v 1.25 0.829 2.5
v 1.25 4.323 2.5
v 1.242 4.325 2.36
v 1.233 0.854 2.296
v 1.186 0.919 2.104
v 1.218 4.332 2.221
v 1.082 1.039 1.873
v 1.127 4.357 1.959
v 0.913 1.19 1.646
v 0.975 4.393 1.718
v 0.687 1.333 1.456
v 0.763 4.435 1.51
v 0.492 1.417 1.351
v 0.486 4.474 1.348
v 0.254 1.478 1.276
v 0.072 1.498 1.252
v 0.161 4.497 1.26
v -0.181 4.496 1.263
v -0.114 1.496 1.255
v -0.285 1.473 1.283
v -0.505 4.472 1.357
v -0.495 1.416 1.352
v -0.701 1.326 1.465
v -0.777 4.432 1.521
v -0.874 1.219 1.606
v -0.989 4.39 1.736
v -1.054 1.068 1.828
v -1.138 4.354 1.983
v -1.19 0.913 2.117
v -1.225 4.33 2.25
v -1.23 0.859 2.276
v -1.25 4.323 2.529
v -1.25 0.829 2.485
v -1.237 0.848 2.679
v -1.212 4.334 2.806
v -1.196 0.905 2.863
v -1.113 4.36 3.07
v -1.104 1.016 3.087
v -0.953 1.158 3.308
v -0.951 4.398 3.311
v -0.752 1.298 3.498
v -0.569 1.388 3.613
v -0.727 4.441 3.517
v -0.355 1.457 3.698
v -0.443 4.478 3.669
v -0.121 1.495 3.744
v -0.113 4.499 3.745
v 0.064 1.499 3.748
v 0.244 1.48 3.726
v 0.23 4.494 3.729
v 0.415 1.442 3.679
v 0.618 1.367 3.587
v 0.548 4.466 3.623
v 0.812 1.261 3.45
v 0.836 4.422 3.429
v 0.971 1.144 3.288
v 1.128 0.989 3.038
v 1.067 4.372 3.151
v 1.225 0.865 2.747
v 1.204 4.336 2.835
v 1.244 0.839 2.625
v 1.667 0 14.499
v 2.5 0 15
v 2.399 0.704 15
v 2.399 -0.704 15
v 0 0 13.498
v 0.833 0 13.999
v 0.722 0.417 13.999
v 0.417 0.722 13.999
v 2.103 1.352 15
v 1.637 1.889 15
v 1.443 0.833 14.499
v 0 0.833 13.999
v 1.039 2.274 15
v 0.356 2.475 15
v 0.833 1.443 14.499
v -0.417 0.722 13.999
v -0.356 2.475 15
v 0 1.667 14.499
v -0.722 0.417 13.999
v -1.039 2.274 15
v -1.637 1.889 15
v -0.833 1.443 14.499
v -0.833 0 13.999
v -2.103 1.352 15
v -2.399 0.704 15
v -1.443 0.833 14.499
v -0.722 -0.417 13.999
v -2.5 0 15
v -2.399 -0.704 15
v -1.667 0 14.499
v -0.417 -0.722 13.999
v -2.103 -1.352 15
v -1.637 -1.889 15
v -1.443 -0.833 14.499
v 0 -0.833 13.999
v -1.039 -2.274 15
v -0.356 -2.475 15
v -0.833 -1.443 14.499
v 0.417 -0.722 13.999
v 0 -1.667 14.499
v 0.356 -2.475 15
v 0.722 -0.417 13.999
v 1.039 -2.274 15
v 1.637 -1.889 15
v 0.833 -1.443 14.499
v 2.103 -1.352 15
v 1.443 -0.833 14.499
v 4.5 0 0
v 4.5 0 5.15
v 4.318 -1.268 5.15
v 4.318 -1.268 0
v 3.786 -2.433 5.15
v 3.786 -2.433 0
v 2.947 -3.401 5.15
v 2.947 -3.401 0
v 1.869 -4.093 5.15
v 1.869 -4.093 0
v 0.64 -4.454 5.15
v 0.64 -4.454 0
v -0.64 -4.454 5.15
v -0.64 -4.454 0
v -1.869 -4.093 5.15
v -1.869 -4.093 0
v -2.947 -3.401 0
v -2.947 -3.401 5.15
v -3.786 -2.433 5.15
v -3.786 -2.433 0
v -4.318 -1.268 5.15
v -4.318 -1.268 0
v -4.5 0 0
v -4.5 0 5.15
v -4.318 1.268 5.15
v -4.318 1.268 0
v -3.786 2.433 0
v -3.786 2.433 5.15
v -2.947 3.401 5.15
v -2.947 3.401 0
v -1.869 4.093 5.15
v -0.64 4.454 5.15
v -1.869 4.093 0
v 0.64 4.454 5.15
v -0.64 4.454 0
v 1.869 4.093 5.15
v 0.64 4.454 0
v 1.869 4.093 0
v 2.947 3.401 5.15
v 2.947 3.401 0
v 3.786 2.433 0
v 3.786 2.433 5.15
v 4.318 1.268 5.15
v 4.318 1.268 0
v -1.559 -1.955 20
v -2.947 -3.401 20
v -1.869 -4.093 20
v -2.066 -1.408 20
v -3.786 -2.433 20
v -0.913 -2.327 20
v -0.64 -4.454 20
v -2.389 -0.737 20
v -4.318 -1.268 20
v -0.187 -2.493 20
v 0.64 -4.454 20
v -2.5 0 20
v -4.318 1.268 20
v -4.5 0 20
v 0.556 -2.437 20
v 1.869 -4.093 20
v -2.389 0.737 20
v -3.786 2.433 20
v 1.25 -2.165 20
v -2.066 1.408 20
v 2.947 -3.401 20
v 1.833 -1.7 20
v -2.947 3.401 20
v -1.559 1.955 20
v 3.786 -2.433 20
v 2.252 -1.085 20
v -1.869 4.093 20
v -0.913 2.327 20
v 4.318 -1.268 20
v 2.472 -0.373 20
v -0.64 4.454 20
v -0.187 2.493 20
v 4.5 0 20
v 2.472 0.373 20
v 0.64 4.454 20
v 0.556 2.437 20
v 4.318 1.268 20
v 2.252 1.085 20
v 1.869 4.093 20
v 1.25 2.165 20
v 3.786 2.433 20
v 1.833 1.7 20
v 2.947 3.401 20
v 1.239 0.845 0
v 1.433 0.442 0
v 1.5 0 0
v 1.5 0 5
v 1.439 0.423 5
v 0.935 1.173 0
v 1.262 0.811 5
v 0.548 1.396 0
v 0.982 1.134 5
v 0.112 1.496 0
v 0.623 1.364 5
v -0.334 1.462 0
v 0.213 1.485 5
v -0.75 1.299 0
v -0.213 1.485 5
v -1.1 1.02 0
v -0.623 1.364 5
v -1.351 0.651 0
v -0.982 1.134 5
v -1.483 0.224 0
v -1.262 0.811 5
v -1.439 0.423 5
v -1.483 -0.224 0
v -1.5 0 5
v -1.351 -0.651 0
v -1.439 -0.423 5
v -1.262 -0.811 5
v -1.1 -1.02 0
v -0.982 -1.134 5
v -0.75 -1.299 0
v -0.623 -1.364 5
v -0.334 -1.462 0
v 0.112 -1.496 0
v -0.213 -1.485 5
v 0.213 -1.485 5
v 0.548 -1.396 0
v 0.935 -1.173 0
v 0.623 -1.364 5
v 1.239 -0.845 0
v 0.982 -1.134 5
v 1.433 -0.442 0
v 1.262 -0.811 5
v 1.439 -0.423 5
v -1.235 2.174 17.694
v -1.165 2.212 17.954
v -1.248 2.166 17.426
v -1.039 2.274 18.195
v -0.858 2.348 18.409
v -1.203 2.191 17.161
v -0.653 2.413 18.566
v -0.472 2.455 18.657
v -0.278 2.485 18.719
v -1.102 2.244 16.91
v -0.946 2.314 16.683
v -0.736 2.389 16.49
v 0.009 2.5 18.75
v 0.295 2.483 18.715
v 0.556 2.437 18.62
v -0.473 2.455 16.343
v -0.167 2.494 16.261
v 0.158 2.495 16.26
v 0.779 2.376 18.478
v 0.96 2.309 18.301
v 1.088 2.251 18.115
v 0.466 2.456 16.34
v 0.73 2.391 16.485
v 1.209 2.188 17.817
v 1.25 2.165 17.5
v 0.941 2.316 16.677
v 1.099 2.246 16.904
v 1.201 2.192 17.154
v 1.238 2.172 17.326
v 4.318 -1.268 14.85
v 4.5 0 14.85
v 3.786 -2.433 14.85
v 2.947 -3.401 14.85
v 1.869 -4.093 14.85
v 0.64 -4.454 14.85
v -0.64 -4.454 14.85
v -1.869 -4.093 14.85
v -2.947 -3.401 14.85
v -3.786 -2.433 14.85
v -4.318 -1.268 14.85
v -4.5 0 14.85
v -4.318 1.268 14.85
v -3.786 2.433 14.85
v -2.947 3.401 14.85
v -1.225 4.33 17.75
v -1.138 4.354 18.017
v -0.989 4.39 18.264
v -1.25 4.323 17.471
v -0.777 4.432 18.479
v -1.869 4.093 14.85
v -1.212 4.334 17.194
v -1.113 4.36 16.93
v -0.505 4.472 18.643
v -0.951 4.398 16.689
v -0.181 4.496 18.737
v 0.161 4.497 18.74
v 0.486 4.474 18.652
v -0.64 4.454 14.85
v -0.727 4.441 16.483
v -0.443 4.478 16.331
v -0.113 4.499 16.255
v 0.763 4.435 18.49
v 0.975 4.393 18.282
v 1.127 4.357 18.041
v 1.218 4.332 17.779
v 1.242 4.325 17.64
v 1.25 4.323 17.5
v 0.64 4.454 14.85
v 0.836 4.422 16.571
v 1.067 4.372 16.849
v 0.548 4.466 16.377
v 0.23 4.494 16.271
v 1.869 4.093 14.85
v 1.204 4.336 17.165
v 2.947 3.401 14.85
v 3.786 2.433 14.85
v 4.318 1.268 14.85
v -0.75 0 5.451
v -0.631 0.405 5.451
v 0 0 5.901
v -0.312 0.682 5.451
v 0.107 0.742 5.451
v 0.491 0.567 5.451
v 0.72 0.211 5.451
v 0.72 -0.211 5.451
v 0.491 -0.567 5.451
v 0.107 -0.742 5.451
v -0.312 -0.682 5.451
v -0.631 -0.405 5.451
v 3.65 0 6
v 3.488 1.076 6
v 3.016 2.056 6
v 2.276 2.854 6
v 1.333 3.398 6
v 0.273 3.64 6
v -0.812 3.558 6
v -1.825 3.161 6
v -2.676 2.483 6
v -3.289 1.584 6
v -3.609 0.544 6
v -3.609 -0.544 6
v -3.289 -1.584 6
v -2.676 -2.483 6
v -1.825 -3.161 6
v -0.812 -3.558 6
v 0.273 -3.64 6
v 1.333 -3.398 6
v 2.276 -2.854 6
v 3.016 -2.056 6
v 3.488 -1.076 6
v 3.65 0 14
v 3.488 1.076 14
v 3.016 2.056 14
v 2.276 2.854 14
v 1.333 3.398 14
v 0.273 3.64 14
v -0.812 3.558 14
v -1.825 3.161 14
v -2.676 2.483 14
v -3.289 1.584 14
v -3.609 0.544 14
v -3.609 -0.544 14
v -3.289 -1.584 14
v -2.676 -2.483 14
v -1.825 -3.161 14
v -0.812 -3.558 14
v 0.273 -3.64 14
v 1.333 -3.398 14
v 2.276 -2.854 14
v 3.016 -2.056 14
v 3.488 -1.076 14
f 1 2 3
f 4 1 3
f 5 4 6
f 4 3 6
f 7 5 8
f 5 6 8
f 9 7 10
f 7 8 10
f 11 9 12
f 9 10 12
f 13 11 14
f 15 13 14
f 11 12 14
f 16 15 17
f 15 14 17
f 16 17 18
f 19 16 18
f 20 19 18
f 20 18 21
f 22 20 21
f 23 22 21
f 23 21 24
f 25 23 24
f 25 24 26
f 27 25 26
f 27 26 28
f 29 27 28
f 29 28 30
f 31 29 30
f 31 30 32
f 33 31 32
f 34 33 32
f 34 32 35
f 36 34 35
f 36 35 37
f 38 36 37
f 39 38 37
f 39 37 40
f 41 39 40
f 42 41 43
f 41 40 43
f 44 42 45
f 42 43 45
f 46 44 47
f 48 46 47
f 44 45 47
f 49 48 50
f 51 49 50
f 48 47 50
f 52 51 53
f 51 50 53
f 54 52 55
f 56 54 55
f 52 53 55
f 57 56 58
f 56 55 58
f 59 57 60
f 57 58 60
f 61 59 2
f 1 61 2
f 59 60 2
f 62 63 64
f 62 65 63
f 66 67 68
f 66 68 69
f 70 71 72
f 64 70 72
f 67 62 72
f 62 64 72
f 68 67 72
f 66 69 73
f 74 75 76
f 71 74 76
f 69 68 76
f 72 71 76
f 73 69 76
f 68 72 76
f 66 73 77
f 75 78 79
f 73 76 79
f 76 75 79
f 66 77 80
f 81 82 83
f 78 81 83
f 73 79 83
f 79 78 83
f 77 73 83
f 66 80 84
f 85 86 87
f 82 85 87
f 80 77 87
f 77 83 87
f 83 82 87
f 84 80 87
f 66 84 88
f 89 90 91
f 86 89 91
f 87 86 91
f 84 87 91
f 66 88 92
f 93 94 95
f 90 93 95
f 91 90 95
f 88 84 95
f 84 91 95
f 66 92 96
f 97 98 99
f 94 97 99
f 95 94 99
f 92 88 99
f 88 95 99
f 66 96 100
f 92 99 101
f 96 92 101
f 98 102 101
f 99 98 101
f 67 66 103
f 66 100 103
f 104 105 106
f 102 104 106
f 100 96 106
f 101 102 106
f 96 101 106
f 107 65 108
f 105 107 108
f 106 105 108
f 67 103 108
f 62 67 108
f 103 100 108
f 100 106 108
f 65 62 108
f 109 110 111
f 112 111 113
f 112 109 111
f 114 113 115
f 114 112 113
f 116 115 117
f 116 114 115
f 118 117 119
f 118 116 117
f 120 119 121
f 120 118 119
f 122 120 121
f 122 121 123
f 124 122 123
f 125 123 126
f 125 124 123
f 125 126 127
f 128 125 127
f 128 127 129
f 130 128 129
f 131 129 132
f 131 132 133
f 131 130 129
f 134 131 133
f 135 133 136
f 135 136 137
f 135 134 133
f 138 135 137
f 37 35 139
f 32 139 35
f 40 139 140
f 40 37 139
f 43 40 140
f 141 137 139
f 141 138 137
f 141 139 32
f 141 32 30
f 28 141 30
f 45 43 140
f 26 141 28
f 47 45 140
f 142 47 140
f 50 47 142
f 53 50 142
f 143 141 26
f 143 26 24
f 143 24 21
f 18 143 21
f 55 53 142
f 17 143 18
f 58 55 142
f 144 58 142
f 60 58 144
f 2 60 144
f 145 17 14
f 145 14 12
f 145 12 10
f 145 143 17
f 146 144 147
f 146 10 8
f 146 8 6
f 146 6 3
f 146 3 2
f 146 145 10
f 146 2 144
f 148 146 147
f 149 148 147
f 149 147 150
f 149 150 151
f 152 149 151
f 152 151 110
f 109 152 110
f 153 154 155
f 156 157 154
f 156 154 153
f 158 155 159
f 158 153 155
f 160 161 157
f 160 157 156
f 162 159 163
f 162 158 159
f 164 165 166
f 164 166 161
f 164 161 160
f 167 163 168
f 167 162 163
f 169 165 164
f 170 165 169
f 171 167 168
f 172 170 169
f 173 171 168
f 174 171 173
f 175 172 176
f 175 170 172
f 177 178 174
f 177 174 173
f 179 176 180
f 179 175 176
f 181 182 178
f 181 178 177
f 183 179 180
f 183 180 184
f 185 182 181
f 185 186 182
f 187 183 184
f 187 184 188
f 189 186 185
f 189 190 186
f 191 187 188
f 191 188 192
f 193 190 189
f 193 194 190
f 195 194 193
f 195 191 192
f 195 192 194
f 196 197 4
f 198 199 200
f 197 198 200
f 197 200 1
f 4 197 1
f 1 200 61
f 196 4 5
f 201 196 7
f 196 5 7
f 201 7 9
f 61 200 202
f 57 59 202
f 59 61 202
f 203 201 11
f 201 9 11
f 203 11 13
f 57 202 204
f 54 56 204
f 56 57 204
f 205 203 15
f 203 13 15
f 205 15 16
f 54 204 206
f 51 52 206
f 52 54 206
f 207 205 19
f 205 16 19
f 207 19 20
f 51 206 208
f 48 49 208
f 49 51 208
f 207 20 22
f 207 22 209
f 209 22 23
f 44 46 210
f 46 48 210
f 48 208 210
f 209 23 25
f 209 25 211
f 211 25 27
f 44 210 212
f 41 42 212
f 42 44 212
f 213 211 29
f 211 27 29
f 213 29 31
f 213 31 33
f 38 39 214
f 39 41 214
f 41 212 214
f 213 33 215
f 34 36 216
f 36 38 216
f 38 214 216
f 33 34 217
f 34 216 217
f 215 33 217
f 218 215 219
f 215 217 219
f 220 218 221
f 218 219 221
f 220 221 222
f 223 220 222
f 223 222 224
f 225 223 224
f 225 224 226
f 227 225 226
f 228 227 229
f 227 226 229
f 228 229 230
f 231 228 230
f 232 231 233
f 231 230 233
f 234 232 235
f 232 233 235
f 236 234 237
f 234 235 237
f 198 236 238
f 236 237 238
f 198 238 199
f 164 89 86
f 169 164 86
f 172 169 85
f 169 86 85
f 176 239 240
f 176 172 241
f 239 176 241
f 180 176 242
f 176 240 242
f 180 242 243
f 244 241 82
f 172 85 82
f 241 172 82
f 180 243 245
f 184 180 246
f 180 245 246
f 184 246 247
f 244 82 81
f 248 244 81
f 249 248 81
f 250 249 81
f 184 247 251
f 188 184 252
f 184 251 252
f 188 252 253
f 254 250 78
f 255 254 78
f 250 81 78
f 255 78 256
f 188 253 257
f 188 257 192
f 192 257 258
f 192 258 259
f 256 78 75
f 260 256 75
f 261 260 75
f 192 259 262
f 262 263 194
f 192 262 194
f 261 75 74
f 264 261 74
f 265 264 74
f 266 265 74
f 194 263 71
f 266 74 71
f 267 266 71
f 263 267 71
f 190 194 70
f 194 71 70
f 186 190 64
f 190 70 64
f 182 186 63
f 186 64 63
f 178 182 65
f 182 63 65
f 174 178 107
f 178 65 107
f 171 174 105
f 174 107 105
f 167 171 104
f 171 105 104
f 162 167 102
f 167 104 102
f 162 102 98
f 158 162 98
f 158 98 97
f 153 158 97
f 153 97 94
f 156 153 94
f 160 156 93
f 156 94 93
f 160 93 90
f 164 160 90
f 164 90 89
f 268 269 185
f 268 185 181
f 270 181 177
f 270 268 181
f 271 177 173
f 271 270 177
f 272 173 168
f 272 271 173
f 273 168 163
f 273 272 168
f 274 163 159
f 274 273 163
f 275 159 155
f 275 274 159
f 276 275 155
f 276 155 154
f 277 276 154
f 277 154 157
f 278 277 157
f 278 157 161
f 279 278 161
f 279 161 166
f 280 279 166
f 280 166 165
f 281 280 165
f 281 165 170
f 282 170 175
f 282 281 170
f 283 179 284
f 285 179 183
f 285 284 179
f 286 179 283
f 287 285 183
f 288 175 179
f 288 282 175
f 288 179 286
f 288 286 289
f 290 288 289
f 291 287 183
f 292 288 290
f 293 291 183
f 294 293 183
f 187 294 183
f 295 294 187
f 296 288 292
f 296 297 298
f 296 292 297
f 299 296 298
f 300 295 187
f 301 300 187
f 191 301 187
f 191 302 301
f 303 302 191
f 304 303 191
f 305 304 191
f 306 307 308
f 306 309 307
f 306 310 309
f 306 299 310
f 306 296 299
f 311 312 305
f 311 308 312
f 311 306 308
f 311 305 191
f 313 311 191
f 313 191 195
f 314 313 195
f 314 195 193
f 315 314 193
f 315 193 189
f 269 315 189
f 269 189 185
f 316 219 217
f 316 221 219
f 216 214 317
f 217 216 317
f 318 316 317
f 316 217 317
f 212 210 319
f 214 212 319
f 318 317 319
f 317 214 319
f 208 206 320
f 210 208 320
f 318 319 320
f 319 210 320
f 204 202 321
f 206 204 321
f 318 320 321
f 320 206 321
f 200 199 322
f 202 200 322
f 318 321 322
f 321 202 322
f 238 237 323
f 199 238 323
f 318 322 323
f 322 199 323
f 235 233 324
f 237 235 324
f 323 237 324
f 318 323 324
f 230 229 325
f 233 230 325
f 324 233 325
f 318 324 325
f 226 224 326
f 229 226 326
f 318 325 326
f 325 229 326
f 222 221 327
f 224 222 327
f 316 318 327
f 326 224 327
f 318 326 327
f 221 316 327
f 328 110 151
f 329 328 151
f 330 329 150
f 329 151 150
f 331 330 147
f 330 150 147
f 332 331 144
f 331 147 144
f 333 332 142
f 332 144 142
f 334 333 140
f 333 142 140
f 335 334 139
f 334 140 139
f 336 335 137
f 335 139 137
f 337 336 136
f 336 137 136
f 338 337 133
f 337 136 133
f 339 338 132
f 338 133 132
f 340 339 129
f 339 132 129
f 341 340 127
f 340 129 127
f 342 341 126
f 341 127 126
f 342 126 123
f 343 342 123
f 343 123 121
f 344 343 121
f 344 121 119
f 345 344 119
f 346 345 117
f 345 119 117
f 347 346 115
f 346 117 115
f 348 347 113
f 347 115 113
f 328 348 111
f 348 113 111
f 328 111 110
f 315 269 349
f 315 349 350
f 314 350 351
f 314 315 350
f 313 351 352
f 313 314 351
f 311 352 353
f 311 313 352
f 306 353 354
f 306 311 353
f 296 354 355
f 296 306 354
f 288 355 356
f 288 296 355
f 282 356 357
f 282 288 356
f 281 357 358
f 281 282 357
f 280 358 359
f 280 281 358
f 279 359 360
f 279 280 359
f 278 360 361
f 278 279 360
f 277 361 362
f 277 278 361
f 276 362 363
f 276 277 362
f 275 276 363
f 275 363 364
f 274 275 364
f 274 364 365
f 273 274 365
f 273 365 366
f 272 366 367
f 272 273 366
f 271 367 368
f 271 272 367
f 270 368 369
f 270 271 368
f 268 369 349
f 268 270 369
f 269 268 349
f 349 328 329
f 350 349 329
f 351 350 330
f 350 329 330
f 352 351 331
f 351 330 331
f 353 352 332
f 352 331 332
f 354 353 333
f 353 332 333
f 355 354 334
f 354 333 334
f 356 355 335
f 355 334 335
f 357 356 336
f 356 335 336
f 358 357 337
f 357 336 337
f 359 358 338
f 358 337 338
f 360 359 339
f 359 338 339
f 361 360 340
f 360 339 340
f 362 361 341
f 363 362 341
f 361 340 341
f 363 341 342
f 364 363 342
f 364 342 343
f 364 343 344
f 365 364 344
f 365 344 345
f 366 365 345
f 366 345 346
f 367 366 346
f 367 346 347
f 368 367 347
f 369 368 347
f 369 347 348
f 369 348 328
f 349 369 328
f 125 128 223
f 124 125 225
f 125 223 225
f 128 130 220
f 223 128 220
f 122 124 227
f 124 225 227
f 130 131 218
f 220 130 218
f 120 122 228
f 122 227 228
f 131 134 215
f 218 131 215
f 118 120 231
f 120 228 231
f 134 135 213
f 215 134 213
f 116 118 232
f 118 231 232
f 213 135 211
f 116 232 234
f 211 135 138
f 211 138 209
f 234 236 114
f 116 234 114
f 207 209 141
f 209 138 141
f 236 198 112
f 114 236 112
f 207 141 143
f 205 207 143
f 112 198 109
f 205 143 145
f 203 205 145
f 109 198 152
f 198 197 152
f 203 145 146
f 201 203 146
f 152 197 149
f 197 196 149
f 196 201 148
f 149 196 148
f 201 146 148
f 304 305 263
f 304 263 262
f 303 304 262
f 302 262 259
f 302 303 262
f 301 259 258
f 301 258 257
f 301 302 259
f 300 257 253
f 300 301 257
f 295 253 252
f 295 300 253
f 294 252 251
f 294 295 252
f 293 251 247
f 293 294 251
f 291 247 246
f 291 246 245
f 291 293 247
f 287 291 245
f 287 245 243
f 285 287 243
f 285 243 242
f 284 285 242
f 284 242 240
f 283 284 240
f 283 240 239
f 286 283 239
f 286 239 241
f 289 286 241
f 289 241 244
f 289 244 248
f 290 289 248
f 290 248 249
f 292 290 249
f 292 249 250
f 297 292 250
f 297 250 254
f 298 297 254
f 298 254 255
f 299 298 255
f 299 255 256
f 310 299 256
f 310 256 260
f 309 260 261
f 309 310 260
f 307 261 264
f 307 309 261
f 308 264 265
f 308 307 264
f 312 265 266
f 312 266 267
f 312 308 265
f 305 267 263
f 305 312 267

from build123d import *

# Parameters (mm, degrees)
SKETCH_1_R                = 4.5
EXTRUDE_1_DEPTH           = 5
SKETCH_2_R                = 3.65
EXTRUDE_2_DEPTH           = 10
SKETCH_3_R                = 4.5
EXTRUDE_3_DEPTH           = 5
CHAMFER_2_SIZE            = 1
CHAMFER_3_SIZE            = 1
HOLE_WIZARD_5_0_5_1_D     = 5
HOLE_WIZARD_5_0_5_1_DEPTH = 5
HOLE_WIZARD_5_0_5_1_TIP   = 1.502151548
HOLE_WIZARD_3_0_3_1_D     = 3
HOLE_WIZARD_3_0_3_1_DEPTH = 5
HOLE_WIZARD_3_0_3_1_TIP   = 0.901290929
M3X0_5_1_REACH            = 24.389
M3X0_5_1_BORE_R           = 1.25


with BuildPart() as part:
    # 草圖1 → 填料-伸長1 (new body)
    with BuildSketch(Plane.XY):
        Circle(SKETCH_1_R)
    extrude(amount=EXTRUDE_1_DEPTH)

    # 草圖2 → 填料-伸長2 (add)
    with BuildSketch(Plane.XY.offset(5)):
        Circle(SKETCH_2_R)
    extrude(amount=EXTRUDE_2_DEPTH)

    # 草圖3 → 填料-伸長3 (add)
    with BuildSketch(Plane.XY.offset(15)):
        Circle(SKETCH_3_R)
    extrude(amount=EXTRUDE_3_DEPTH)

    # 導角2
    # the kernel refuses this chamfer: 1 mm, written as the material it adds along each edge
    with BuildSketch(Plane(origin=(0, 0, 5), x_dir=(1, 0, 0), z_dir=(0, -1, 0))) as chamfer_2_piece_1_section:
        Polygon((3.65, CHAMFER_2_SIZE), (3.65 + CHAMFER_2_SIZE, 0), (3.65, 0), align=None)
    chamfer_2_piece_1 = revolve(axis=Axis((0, 0, 5), (0, 0, 1)), mode=Mode.PRIVATE)
    chamfer_2_piece_1 = chamfer_2_piece_1 & Plane(origin=(0, 0, 5.572415942), x_dir=(1, 0, 0), z_dir=(0, 0, -1)) * Cylinder(4.5, 19, mode=Mode.PRIVATE)
    add(chamfer_2_piece_1)

    # 導角3
    # the kernel refuses this chamfer: 1 mm, written as the material it adds along each edge
    with BuildSketch(Plane(origin=(0, 0, 15), x_dir=(1, 0, 0), z_dir=(0, -1, 0))) as chamfer_3_piece_1_section:
        Polygon((3.65, -CHAMFER_3_SIZE), (3.65 + CHAMFER_3_SIZE, 0), (3.65, 0), align=None)
    chamfer_3_piece_1 = revolve(axis=Axis((0, 0, 15), (0, 0, 1)), mode=Mode.PRIVATE)
    chamfer_3_piece_1 = chamfer_3_piece_1 & Plane(origin=(0, 0, 14.427584058), x_dir=(1, 0, 0), z_dir=(0, 0, -1)) * Cylinder(4.5, 19, mode=Mode.PRIVATE)
    add(chamfer_3_piece_1)

    # Ø5.0 (5) 直徑孔1
    with Locations(Plane.XY.offset(20)):
        with Locations((0, 0)):
            Hole(HOLE_WIZARD_5_0_5_1_D / 2, depth=HOLE_WIZARD_5_0_5_1_DEPTH)
            with Locations((0, 0, -(HOLE_WIZARD_5_0_5_1_DEPTH + HOLE_WIZARD_5_0_5_1_TIP / 2))):  # 118° drill point
                Cone(0, HOLE_WIZARD_5_0_5_1_D / 2, HOLE_WIZARD_5_0_5_1_TIP, mode=Mode.SUBTRACT)

    # Ø3.0 (3) 直徑孔1
    with Locations(Plane(origin=(0, 0, 0), x_dir=(-1, 0, 0), z_dir=(0, 0, -1))):
        with Locations((0, 0)):
            Hole(HOLE_WIZARD_3_0_3_1_D / 2, depth=HOLE_WIZARD_3_0_3_1_DEPTH)
            with Locations((0, 0, -(HOLE_WIZARD_3_0_3_1_DEPTH + HOLE_WIZARD_3_0_3_1_TIP / 2))):  # 118° drill point
                Cone(0, HOLE_WIZARD_3_0_3_1_D / 2, HOLE_WIZARD_3_0_3_1_TIP, mode=Mode.SUBTRACT)

    # M3x0.5  螺絲攻的螺孔鑽1 bore → M3x0.5  螺絲攻的螺孔鑽1 (cut, up to next)
    with BuildSketch(Plane(origin=(0, 4.5, 0), x_dir=(1, 0, 0), z_dir=(0, 1, 0)), mode=Mode.PRIVATE) as m3x0_5_1_sk1:
        with Locations((0, -2.5)):
            Circle(M3X0_5_1_BORE_R)
    m3x0_5_1_tool1 = extrude(m3x0_5_1_sk1.sketch, amount=-M3X0_5_1_REACH, mode=Mode.PRIVATE) & part.part
    m3x0_5_1 = m3x0_5_1_tool1.solids().sort_by_distance((0, 4.5, 2.5))[0]
    add(m3x0_5_1, mode=Mode.SUBTRACT)

    # 鏡射1: M3x0.5  螺絲攻的螺孔鑽1 across plane
    add(m3x0_5_1.mirror(Plane(origin=(0, 0, 10), x_dir=(1, 0, 0), z_dir=(0, 0, -1))), mode=Mode.SUBTRACT)


solid = part.part
